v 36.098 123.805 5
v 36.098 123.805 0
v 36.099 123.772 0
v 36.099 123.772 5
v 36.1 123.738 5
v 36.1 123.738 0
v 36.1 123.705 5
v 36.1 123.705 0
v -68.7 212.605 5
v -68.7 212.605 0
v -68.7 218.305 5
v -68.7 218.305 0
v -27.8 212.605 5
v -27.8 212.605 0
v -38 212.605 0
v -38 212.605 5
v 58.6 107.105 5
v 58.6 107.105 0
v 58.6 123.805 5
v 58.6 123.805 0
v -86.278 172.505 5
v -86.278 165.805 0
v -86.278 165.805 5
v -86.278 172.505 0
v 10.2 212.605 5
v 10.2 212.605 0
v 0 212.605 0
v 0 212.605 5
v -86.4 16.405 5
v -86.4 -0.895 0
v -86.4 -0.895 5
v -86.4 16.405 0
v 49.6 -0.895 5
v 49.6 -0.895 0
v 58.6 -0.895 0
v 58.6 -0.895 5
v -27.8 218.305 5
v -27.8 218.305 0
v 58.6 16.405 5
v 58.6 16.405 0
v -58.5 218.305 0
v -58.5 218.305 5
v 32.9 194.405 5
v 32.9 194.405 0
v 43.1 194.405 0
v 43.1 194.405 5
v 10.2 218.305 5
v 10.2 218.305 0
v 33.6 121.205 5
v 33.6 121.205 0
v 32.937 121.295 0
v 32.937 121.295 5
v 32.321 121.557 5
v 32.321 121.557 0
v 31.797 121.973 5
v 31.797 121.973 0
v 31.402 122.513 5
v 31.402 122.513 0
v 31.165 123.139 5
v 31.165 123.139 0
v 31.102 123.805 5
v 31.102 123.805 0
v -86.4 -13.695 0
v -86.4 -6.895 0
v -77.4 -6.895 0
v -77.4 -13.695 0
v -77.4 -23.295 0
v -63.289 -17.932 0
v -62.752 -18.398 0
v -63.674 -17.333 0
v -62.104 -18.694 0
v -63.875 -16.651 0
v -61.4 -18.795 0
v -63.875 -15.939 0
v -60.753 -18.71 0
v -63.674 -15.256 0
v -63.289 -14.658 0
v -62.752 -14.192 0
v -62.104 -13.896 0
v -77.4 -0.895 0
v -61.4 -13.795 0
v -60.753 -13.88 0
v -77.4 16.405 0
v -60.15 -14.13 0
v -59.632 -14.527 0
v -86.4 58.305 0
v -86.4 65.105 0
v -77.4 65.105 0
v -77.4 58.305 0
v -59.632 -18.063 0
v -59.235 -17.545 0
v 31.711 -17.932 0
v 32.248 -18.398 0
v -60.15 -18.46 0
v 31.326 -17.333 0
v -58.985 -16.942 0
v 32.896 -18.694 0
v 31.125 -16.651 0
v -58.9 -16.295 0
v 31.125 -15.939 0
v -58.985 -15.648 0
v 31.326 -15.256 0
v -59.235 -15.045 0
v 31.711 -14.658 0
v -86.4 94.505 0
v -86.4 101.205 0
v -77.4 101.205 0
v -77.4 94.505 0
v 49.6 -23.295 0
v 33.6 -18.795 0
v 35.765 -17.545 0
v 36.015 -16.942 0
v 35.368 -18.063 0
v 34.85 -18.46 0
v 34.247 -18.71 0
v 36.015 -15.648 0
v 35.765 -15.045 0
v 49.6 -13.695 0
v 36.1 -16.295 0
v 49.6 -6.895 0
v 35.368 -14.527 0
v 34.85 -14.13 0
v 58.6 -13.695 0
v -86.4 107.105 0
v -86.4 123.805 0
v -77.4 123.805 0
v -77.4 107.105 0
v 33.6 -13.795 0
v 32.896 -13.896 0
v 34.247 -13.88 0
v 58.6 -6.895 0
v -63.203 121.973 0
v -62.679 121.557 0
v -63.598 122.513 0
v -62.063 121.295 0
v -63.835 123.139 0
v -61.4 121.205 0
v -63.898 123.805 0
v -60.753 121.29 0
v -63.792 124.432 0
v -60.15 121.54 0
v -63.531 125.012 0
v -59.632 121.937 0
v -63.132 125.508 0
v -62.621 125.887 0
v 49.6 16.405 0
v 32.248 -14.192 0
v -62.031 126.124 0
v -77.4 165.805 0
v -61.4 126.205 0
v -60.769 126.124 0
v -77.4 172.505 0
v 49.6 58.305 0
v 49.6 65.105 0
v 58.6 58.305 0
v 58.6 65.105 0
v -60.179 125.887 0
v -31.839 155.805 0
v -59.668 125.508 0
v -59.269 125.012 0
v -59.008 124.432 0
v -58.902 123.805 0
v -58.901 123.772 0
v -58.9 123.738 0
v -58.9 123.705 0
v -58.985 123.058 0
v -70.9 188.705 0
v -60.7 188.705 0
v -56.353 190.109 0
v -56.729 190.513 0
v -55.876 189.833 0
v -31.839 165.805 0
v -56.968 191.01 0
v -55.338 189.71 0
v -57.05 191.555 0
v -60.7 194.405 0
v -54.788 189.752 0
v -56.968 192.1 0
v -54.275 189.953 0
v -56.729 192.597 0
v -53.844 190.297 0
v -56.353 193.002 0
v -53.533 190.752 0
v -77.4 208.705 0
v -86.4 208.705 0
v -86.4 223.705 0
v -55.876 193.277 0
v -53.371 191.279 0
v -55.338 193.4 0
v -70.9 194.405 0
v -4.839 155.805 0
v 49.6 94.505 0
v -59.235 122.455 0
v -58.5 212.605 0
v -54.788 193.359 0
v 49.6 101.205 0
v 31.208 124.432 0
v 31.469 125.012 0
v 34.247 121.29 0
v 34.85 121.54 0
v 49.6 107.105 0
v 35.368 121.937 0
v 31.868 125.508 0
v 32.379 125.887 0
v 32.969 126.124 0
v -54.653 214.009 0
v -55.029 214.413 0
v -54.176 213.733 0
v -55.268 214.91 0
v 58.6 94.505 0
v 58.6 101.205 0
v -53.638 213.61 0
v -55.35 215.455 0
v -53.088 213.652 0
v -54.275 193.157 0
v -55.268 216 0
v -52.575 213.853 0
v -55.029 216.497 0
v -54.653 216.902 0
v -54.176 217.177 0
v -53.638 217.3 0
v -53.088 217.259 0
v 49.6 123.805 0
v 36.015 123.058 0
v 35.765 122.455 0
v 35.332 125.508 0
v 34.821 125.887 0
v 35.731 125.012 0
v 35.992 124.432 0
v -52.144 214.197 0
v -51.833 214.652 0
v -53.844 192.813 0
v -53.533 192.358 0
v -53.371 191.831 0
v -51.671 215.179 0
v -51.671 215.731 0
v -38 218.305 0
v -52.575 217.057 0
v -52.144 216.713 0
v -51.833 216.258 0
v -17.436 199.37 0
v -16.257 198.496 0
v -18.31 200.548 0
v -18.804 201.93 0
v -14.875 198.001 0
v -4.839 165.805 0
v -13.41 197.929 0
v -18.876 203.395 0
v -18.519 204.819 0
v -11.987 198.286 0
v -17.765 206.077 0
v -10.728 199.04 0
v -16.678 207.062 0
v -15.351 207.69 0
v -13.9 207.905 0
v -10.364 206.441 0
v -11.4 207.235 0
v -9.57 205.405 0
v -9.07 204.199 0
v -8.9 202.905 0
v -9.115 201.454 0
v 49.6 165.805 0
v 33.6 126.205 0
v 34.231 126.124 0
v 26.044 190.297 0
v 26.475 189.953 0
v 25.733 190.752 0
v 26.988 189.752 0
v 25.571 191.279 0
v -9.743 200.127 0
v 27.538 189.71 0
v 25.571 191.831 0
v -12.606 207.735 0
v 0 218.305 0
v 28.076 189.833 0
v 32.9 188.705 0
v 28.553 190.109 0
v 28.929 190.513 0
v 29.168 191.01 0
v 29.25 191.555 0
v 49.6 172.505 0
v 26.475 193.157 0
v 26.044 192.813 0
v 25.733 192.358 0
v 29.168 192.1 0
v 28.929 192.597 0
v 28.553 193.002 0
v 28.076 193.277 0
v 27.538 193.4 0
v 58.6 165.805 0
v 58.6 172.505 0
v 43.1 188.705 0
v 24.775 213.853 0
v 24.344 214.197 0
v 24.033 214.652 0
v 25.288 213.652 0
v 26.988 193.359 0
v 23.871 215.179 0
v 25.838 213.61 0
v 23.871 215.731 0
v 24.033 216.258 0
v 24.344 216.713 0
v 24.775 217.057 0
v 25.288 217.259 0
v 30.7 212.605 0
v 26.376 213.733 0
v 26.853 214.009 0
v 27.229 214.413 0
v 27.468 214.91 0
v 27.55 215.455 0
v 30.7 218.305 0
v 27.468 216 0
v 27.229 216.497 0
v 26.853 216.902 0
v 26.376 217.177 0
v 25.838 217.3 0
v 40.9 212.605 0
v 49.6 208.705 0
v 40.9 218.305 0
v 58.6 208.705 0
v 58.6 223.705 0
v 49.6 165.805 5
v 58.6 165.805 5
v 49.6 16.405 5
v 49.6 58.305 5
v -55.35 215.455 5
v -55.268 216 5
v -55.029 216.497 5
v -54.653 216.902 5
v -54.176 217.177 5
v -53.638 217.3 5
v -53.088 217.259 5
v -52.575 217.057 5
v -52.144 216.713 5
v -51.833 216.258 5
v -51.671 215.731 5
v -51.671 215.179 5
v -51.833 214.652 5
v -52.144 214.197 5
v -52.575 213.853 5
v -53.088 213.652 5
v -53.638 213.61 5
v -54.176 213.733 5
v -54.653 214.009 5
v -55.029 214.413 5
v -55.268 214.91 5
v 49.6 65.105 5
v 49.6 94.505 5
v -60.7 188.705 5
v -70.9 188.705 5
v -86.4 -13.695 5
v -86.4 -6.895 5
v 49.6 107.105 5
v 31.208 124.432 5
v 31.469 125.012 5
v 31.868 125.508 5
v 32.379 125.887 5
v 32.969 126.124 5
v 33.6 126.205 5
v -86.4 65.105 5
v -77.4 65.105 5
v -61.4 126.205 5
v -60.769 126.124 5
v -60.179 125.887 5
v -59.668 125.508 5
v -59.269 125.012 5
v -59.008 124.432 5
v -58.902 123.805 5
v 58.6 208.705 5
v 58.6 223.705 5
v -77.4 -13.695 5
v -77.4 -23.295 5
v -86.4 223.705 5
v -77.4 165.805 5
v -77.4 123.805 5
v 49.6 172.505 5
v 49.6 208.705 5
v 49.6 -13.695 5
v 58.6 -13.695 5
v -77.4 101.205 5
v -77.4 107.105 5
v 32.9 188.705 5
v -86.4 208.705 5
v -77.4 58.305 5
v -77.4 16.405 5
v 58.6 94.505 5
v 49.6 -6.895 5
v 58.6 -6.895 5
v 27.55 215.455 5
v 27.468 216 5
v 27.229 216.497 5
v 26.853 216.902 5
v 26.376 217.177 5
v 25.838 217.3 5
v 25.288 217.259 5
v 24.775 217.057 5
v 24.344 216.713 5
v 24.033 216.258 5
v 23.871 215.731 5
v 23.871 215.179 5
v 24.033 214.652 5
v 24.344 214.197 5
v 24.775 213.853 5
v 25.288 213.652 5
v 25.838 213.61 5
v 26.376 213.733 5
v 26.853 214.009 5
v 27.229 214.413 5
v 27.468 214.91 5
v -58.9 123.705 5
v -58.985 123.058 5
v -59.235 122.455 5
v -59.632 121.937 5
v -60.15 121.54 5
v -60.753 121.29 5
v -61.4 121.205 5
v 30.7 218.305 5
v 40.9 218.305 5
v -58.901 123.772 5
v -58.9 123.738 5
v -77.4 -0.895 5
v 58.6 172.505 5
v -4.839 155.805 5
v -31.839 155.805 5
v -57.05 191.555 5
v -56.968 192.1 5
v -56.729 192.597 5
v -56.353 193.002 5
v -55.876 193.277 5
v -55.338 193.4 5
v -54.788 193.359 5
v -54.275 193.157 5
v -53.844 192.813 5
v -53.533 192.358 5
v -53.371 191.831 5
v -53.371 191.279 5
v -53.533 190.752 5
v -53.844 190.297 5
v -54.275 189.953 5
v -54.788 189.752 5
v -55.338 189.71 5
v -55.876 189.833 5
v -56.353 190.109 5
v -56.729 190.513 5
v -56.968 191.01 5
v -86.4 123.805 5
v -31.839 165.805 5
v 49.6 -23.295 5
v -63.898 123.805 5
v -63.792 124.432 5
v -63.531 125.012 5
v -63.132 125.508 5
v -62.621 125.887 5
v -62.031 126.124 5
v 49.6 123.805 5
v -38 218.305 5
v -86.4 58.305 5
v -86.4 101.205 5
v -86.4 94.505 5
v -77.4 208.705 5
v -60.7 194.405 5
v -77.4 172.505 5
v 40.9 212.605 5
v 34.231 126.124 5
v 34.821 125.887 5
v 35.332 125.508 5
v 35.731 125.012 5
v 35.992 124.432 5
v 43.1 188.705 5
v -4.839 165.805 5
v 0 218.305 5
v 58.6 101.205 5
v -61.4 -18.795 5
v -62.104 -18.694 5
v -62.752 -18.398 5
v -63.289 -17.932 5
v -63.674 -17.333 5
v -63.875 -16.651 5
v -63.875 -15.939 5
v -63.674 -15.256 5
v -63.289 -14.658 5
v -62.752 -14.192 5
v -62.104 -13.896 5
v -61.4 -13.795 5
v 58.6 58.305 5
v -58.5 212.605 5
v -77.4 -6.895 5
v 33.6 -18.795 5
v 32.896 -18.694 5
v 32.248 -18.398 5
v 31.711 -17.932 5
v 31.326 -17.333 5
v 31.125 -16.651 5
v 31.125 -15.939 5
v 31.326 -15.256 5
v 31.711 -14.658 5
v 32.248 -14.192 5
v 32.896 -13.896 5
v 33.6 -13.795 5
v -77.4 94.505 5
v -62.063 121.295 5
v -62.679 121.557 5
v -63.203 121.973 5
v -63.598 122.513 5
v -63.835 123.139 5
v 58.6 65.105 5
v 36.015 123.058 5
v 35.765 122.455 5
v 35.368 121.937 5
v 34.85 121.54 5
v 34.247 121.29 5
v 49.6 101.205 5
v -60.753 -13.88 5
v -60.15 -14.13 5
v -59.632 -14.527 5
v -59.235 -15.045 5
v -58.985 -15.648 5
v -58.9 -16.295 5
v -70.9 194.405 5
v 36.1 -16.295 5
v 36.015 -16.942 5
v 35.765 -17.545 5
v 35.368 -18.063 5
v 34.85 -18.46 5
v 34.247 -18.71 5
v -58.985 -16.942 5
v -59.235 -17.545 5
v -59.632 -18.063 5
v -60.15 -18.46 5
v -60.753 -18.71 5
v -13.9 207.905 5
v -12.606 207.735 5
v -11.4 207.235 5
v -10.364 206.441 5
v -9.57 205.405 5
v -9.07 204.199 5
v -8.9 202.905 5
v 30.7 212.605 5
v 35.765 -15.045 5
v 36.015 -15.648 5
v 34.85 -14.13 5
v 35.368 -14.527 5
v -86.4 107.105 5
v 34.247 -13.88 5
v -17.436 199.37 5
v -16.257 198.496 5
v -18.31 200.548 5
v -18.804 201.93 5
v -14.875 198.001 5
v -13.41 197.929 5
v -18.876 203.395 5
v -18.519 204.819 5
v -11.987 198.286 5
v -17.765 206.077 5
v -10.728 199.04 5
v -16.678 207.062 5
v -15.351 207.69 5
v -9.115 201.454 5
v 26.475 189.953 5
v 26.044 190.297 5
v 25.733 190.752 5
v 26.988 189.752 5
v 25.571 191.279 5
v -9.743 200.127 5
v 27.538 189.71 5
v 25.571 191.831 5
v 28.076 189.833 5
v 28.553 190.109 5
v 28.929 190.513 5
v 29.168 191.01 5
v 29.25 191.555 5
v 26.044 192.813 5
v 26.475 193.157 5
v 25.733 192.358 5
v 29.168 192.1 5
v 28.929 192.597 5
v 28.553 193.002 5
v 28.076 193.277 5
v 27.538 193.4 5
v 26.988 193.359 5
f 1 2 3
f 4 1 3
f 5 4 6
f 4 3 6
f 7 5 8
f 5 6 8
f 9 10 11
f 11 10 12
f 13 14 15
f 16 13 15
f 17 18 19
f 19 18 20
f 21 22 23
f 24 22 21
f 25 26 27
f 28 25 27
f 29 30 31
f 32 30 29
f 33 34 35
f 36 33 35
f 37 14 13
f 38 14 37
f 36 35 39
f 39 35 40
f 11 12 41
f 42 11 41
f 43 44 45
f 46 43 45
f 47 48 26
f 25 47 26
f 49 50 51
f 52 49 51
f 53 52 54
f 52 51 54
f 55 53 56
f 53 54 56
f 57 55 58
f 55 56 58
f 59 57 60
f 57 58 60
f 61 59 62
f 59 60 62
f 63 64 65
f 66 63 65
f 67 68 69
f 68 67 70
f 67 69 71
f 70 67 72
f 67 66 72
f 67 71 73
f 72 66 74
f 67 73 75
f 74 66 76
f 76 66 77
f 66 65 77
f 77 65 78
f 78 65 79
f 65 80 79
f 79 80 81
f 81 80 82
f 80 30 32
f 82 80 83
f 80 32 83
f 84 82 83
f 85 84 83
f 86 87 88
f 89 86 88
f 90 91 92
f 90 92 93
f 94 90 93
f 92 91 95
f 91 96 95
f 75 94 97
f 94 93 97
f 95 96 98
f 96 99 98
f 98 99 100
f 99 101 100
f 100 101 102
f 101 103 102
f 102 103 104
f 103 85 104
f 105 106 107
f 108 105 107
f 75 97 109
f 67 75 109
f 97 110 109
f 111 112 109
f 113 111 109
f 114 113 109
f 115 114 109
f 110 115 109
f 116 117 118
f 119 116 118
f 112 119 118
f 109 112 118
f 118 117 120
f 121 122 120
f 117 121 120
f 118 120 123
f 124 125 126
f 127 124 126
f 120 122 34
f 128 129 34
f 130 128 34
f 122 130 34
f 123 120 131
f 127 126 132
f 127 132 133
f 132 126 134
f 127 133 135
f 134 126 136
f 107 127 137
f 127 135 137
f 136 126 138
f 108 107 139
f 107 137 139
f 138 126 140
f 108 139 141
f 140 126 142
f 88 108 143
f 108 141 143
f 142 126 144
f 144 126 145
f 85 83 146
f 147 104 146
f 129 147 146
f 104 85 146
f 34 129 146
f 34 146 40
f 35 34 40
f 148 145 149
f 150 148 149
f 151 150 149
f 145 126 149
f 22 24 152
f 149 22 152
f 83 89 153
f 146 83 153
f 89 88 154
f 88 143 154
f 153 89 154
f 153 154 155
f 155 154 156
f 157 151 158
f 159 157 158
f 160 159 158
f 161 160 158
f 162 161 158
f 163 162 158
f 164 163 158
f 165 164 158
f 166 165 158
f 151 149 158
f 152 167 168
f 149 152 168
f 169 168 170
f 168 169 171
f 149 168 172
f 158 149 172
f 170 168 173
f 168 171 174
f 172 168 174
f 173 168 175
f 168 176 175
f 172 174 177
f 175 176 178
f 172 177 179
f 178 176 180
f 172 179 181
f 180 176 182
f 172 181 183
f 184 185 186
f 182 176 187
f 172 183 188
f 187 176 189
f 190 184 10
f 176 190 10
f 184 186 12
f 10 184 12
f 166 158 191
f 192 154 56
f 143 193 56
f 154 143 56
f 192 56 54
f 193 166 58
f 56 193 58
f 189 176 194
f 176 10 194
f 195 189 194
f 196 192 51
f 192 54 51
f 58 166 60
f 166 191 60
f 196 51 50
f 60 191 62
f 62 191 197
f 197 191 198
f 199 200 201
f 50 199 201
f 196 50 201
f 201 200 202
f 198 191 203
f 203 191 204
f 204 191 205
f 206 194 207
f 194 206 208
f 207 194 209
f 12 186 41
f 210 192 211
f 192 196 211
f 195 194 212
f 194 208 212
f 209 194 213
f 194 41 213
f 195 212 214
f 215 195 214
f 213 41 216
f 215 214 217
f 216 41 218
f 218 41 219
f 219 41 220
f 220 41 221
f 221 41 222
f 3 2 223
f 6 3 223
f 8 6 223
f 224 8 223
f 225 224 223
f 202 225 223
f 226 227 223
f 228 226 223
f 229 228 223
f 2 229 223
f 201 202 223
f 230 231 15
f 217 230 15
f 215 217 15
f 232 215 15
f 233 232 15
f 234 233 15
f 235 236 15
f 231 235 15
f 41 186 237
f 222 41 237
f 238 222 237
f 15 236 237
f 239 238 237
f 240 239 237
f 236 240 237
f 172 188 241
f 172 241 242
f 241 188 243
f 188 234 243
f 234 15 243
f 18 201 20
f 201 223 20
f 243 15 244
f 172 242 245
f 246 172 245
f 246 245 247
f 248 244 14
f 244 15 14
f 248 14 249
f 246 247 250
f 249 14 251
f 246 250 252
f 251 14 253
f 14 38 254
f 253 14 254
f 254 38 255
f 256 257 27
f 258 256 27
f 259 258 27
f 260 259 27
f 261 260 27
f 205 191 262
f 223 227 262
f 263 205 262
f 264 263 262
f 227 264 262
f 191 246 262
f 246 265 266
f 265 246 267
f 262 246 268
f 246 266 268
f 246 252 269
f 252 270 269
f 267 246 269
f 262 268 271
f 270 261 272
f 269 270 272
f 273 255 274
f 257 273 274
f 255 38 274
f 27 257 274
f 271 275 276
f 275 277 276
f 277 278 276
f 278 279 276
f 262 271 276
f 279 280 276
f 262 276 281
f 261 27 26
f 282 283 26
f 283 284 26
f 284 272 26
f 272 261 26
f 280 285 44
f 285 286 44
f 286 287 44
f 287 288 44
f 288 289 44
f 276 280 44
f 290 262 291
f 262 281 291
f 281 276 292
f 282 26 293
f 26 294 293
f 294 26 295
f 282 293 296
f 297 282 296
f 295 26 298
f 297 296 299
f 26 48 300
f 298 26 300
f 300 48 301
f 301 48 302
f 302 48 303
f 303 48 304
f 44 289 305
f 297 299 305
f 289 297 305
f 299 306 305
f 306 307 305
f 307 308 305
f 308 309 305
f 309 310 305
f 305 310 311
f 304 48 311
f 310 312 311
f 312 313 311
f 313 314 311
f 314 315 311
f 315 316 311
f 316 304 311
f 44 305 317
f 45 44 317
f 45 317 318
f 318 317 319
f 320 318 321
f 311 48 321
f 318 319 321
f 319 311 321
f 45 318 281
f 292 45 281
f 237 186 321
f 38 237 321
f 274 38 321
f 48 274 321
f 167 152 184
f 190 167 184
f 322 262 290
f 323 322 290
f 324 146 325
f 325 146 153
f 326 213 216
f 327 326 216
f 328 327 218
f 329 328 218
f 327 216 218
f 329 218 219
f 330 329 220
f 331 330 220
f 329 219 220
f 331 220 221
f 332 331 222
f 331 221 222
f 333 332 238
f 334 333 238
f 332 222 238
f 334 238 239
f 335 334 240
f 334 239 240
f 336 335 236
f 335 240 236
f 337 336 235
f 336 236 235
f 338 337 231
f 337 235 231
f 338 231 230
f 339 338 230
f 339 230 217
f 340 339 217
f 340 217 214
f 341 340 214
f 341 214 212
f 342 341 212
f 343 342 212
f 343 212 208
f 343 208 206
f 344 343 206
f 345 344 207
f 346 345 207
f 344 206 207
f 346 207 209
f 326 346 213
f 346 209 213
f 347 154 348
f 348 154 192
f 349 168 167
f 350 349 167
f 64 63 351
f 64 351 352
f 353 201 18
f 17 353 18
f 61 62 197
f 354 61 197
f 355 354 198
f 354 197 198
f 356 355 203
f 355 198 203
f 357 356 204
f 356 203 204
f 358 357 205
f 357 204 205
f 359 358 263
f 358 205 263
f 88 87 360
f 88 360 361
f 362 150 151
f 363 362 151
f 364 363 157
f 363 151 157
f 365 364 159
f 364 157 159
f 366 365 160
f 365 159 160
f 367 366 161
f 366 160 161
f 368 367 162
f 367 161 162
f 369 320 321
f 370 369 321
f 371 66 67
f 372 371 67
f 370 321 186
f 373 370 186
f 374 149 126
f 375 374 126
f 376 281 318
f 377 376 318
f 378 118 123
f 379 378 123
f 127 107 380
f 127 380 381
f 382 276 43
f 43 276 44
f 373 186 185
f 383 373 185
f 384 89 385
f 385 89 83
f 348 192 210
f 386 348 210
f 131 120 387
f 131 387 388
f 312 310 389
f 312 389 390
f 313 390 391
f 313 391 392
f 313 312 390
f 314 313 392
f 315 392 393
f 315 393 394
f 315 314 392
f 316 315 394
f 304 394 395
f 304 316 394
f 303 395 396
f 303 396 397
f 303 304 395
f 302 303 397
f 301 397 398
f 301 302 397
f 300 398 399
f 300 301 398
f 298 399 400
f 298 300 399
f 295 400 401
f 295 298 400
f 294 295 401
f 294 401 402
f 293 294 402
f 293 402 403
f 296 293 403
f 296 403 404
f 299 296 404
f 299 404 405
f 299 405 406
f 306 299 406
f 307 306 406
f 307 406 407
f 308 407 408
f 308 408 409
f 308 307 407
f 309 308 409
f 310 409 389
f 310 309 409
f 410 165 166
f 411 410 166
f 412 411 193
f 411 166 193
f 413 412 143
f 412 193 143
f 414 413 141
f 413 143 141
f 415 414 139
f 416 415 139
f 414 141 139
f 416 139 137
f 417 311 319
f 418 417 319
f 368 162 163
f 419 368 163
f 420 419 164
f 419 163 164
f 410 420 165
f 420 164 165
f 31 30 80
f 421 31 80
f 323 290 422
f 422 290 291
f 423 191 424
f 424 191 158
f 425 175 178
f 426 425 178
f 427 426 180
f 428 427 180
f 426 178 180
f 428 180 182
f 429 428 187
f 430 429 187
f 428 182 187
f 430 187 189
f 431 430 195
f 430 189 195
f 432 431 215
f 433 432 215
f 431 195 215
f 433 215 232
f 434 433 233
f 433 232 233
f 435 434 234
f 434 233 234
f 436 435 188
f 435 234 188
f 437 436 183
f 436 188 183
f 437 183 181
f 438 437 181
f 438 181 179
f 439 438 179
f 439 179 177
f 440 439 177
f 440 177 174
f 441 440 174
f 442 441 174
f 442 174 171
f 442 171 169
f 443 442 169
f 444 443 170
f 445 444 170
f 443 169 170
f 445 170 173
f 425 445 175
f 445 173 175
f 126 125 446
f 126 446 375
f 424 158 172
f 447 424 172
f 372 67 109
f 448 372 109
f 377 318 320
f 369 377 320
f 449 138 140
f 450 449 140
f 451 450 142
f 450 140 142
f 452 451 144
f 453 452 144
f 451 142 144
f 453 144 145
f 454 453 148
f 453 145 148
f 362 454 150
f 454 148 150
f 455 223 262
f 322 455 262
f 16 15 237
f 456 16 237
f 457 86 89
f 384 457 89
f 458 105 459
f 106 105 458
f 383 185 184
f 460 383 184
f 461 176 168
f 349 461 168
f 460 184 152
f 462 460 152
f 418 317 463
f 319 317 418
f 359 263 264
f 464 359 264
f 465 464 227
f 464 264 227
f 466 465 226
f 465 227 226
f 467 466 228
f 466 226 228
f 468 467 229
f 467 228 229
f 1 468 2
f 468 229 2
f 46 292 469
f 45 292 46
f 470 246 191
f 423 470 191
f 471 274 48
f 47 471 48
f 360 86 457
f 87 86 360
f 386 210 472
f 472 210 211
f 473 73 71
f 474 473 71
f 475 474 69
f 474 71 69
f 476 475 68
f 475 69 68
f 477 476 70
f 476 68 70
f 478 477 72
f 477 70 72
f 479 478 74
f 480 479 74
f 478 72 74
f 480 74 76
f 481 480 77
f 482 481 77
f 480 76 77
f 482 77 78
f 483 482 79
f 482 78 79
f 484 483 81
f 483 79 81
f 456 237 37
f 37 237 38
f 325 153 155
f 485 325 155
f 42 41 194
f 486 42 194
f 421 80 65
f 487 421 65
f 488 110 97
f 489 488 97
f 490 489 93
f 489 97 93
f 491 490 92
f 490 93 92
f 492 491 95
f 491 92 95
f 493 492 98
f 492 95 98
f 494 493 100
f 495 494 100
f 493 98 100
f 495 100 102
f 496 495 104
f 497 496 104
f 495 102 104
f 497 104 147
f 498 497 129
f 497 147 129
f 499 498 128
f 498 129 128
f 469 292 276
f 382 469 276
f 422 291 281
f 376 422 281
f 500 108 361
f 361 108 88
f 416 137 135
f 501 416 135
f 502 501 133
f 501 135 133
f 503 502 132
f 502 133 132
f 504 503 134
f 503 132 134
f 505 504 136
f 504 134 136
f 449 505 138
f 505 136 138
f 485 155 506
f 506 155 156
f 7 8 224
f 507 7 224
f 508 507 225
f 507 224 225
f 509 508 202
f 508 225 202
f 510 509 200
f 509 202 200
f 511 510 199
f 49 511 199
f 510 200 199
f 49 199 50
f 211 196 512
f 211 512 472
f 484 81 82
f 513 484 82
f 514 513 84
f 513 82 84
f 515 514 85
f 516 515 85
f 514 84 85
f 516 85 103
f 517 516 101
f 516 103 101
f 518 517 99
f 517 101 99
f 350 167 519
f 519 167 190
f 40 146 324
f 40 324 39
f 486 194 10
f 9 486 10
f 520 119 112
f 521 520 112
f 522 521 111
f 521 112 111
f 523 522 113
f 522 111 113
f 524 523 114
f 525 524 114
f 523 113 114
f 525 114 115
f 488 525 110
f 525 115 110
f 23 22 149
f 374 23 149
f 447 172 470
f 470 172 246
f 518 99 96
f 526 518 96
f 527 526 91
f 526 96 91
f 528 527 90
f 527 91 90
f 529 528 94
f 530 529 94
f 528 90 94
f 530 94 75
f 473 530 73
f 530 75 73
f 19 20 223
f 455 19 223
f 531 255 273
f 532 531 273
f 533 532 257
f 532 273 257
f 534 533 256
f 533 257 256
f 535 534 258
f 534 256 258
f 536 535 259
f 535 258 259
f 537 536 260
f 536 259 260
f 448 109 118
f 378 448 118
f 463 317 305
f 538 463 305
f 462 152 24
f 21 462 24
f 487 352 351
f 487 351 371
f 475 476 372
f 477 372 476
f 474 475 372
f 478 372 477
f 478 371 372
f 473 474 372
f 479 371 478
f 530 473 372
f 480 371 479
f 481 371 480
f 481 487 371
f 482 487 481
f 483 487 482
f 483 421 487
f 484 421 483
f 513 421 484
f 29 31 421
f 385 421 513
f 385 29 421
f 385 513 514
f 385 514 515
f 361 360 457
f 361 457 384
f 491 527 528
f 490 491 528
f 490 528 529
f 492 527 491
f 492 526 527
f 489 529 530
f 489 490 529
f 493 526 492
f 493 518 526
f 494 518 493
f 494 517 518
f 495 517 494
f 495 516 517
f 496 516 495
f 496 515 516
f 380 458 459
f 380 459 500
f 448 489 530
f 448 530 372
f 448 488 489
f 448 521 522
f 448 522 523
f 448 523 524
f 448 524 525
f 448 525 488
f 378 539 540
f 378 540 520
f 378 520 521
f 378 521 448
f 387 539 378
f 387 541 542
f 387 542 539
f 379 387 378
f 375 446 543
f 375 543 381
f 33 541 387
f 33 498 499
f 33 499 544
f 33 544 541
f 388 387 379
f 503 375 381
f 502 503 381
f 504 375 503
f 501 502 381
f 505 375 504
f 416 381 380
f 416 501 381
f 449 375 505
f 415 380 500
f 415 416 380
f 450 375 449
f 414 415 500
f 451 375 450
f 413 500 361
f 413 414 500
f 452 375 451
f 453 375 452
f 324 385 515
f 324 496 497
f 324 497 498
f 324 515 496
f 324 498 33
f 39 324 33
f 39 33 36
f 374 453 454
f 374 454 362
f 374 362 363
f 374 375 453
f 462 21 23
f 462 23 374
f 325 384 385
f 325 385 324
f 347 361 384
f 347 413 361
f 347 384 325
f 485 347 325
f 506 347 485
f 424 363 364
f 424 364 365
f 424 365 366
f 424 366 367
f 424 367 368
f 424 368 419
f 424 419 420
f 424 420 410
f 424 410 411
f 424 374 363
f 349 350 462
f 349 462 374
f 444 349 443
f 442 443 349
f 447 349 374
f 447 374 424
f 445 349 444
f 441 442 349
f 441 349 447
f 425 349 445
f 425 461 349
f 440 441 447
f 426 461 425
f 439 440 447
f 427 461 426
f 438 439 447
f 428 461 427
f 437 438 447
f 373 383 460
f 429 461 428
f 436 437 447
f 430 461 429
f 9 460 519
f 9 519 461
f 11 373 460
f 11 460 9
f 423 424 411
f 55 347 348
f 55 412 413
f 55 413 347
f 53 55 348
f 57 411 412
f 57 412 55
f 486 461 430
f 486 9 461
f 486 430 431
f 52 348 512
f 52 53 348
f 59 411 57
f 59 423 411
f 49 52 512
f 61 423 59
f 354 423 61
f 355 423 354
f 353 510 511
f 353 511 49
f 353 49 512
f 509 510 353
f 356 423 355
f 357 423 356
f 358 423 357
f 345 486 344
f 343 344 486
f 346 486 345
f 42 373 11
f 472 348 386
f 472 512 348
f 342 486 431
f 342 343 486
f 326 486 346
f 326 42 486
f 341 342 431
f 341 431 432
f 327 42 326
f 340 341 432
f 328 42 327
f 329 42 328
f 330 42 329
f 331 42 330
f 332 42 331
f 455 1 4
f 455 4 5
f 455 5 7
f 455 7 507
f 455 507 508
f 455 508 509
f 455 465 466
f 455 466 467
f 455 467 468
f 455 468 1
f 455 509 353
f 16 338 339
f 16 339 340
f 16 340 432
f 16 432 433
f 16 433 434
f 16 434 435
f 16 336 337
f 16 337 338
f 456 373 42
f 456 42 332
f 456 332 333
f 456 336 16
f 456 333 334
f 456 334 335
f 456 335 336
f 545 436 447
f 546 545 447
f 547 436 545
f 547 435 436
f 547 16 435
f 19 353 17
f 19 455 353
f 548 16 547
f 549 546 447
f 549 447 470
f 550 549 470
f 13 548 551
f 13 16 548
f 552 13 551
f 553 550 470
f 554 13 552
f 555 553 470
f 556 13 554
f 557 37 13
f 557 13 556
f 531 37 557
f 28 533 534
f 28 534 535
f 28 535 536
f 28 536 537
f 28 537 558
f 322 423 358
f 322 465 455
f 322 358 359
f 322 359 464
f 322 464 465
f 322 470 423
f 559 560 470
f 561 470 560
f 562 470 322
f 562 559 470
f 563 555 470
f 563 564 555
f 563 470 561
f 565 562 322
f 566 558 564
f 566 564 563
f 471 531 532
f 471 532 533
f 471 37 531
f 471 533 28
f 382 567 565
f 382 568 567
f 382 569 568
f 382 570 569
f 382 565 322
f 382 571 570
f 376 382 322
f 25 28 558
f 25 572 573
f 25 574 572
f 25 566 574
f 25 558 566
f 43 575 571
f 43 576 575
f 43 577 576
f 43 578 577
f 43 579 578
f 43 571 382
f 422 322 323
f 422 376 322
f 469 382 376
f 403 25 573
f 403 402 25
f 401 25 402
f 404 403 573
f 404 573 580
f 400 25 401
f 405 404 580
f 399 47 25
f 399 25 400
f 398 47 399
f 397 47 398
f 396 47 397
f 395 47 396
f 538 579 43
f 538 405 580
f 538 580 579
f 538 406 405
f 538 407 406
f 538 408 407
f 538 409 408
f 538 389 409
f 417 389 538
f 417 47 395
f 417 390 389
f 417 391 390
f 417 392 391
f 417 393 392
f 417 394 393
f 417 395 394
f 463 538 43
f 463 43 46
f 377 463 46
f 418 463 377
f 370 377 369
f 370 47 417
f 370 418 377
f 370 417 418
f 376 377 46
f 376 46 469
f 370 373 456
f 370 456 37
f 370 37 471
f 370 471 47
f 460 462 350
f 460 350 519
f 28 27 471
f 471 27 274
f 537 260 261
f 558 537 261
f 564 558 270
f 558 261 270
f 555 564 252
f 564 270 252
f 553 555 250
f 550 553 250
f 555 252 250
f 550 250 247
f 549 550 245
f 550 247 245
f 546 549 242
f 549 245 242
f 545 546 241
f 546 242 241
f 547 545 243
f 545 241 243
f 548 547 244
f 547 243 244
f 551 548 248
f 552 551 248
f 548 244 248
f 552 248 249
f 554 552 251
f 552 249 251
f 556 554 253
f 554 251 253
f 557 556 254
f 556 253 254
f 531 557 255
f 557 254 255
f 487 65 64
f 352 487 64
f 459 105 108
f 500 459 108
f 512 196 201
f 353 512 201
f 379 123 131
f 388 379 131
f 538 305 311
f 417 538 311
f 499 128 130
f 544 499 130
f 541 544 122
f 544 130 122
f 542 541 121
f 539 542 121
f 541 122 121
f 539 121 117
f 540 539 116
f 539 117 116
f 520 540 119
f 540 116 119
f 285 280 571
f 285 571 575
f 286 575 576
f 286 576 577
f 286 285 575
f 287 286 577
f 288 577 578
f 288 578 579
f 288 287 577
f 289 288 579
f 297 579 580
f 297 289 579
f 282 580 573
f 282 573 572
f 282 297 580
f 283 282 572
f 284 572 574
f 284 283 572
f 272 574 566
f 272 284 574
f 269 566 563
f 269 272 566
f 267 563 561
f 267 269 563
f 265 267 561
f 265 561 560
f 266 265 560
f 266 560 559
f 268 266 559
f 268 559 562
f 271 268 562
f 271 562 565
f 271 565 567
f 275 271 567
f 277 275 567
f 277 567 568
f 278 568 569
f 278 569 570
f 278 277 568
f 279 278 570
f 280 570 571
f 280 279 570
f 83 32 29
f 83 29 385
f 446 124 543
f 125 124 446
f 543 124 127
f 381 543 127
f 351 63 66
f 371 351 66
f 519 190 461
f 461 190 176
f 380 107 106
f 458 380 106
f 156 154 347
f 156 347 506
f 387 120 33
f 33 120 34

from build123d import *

# Parameters (mm, degrees)
F0_W     = 9
F0_H     = 16.7
F0_H_2   = 6.7
F0_W_2   = 16
F0_H_3   = 5.9
F0_W_3   = 95
F0_W_4   = 8.8775146961
F0_W_5   = 6.5
F0_H_4   = 5.7
F0_R     = 1.85
F0_W_6   = 8.7
F0_W_7   = 13.9
F0_H_5   = 29.4
F0_H_6   = 6.8
F0_H_7   = 41.9
F0_H_8   = 6
F0_H_9   = 17.3
F1_DEPTH = 5


with BuildPart() as f1:
    # F0 (on Top) → F1 (new body)
    with BuildSketch(Plane.XY):
        with BuildLine():
            Line((-77.4, 165.8051506788), (-77.4, 123.8051506788))
            Line((-77.4, 123.8051506788), (-63.8979991994, 123.8051506788))
            ThreePointArc((-63.8979991994, 123.8051506788), (-63.1320508076, 125.5079263165), (-61.4, 126.2051506788))
            Line((-61.4, 126.2051506788), (-61.4, 165.8051506788))
            Line((-61.4, 165.8051506788), (-77.4, 165.8051506788))
        make_face()
        with BuildLine():
            Line((-77.4, 123.8051506788), (-77.4, 107.1051506788))
            Line((-77.4, 107.1051506788), (-61.4, 107.1051506788))
            Line((-61.4, 107.1051506788), (-61.4, 121.2051506788))
            ThreePointArc((-61.4, 121.2051506788), (-63.2027756377, 121.9730998712), (-63.8979991994, 123.8051506788))
            Line((-63.8979991994, 123.8051506788), (-77.4, 123.8051506788))
        make_face()
        with BuildLine():
            Line((-31.8387573481, 165.8051506788), (-61.4, 165.8051506788))
            Line((-61.4, 165.8051506788), (-61.4, 126.2051506788))
            ThreePointArc((-61.4, 126.2051506788), (-59.6679491924, 125.5079263165), (-58.9020008006, 123.8051506788))
            Line((-58.9020008006, 123.8051506788), (31.1020008006, 123.8051506788))
            ThreePointArc((31.1020008006, 123.8051506788), (31.8679491924, 125.5079263165), (33.6, 126.2051506788))
            Line((33.6, 126.2051506788), (33.6, 165.8051506788))
            Line((33.6, 165.8051506788), (-4.8387573481, 165.8051506788))
            Line((-4.8387573481, 165.8051506788), (-4.8387573481, 155.8051506788))
            Line((-4.8387573481, 155.8051506788), (-31.8387573481, 155.8051506788))
            Line((-31.8387573481, 155.8051506788), (-31.8387573481, 165.8051506788))
        make_face()
        with BuildLine():
            Line((-61.4, 121.2051506788), (-61.4, 107.1051506788))
            Line((-61.4, 107.1051506788), (33.6, 107.1051506788))
            Line((33.6, 107.1051506788), (33.6, 121.2051506788))
            ThreePointArc((33.6, 121.2051506788), (31.7972243623, 121.9730998712), (31.1020008006, 123.8051506788))
            Line((31.1020008006, 123.8051506788), (-58.9020008006, 123.8051506788))
            ThreePointArc((-58.9020008006, 123.8051506788), (-58.9005002502, 123.7551606858), (-58.9, 123.7051506788))
            ThreePointArc((-58.9, 123.7051506788), (-59.632233047, 121.9373837258), (-61.4, 121.2051506788))
        make_face()
        with BuildLine():
            Line((33.6, 121.2051506788), (33.6, 107.1051506788))
            Line((33.6, 107.1051506788), (49.6, 107.1051506788))
            Line((49.6, 107.1051506788), (49.6, 123.8051506788))
            Line((49.6, 123.8051506788), (36.0979991994, 123.8051506788))
            ThreePointArc((36.0979991994, 123.8051506788), (36.0994997498, 123.7551606858), (36.1, 123.7051506788))
            ThreePointArc((36.1, 123.7051506788), (35.367766953, 121.9373837258), (33.6, 121.2051506788))
        make_face()
        with Locations((54.1, 115.4551506788)):
            Rectangle(F0_W, F0_H)
        with Locations((-81.9, 115.4551506788)):
            Rectangle(F0_W, F0_H)
        with Locations((-81.9, 97.8551506788)):
            Rectangle(F0_W, F0_H_2)
        with Locations((-69.4, 97.8551506788)):
            Rectangle(F0_W_2, F0_H_2)
        with Locations((-69.4, 104.1551506788)):
            Rectangle(F0_W_2, F0_H_3)
        with Locations((-13.9, 104.1551506788)):
            Rectangle(F0_W_3, F0_H_3)
        with Locations((-13.9, 97.8551506788)):
            Rectangle(F0_W_3, F0_H_2)
        with Locations((41.6, 97.8551506788)):
            Rectangle(F0_W_2, F0_H_2)
        with Locations((41.6, 104.1551506788)):
            Rectangle(F0_W_2, F0_H_3)
        with Locations((54.1, 97.8551506788)):
            Rectangle(F0_W, F0_H_2)
        with BuildLine():
            Line((36.0979991994, 123.8051506788), (49.6, 123.8051506788))
            Line((49.6, 123.8051506788), (49.6, 165.8051506788))
            Line((49.6, 165.8051506788), (33.6, 165.8051506788))
            Line((33.6, 165.8051506788), (33.6, 126.2051506788))
            ThreePointArc((33.6, 126.2051506788), (35.3320508076, 125.5079263165), (36.0979991994, 123.8051506788))
        make_face()
        with Locations((54.1, 169.1551506788)):
            Rectangle(F0_W, F0_H_2)
        Polygon((-77.4, 172.5051506788), (-77.4, 165.8051506788), (-61.4, 165.8051506788), (-31.8387573481, 165.8051506788), (-18.3387573481, 165.8051506788), (-4.8387573481, 165.8051506788), (33.6, 165.8051506788), (49.6, 165.8051506788), (49.6, 172.5051506788), (-8.3387573481, 172.5051506788), (-28.3387573481, 172.5051506788), align=None)
        with Locations((-81.8387573481, 169.1551506788)):
            Rectangle(F0_W_4, F0_H_2)
        Polygon((-77.4, 188.7051506788), (-77.4, 172.5051506788), (-28.3387573481, 172.5051506788), (-8.3387573481, 172.5051506788), (49.6, 172.5051506788), (49.6, 188.7051506788), (43.1, 188.7051506788), (32.9, 188.7051506788), (-60.7, 188.7051506788), (-70.9, 188.7051506788), align=None)
        with Locations((-74.15, 191.5551506788)):
            Rectangle(F0_W_5, F0_H_4)
        Polygon((-60.7, 191.5551506788), (-60.7, 188.7051506788), (32.9, 188.7051506788), (32.9, 191.5551506788), (32.9, 194.4051506788), (-60.7, 194.4051506788), align=None)
        with BuildLine():
            ThreePointArc((-53.35, 191.5551506788), (-55.2, 189.7051506788), (-57.05, 191.5551506788))
            ThreePointArc((-57.05, 191.5551506788), (-55.2, 193.4051506788), (-53.35, 191.5551506788))
        make_face(mode=Mode.SUBTRACT)
        with Locations((27.4, 191.5551506788)):
            Circle(F0_R, mode=Mode.SUBTRACT)
        with Locations((46.35, 191.5551506788)):
            Rectangle(F0_W_5, F0_H_4)
        Polygon((-77.4, 208.7051506788), (-77.4, 194.4051506788), (-70.9, 194.4051506788), (-60.7, 194.4051506788), (32.9, 194.4051506788), (43.1, 194.4051506788), (49.6, 194.4051506788), (49.6, 208.7051506788), (-13.9, 208.7051506788), align=None)
        with BuildLine():
            ThreePointArc((-8.9, 202.9051506788), (-17.4355339059, 199.3696167728), (-13.9, 207.9051506788))
            ThreePointArc((-13.9, 207.9051506788), (-10.3644660941, 206.4406845847), (-8.9, 202.9051506788))
        make_face(mode=Mode.SUBTRACT)
        Polygon((-86.4, 208.7051506788), (-77.4, 208.7051506788), (-77.4, 212.6051506788), (-77.4, 218.3051506788), (-77.4, 223.7051506788), (-86.4, 223.7051506788), align=None)
        with Locations((-73.05, 215.4551506788)):
            Rectangle(F0_W_6, F0_H_4)
        Polygon((-77.4, 212.6051506788), (-77.4, 208.7051506788), (-13.9, 208.7051506788), (-13.9, 212.6051506788), (-27.8, 212.6051506788), (-38, 212.6051506788), (-58.5, 212.6051506788), (-68.7, 212.6051506788), align=None)
        Polygon((-77.4, 223.7051506788), (-77.4, 218.3051506788), (-68.7, 218.3051506788), (-58.5, 218.3051506788), (-38, 218.3051506788), (-27.8, 218.3051506788), (-13.9, 218.3051506788), (-13.9, 223.7051506788), align=None)
        Polygon((-58.5, 215.4551506788), (-58.5, 212.6051506788), (-38, 212.6051506788), (-38, 218.3051506788), (-58.5, 218.3051506788), align=None)
        with BuildLine():
            ThreePointArc((-51.65, 215.4551506788), (-53.5, 213.6051506788), (-55.35, 215.4551506788))
            ThreePointArc((-55.35, 215.4551506788), (-53.5, 217.3051506788), (-51.65, 215.4551506788))
        make_face(mode=Mode.SUBTRACT)
        with Locations((-20.85, 215.4551506788)):
            Rectangle(F0_W_7, F0_H_4)
        with Locations((-6.95, 215.4551506788)):
            Rectangle(F0_W_7, F0_H_4)
        Polygon((-13.9, 212.6051506788), (-13.9, 208.7051506788), (49.6, 208.7051506788), (49.6, 212.6051506788), (40.9, 212.6051506788), (30.7, 212.6051506788), (10.2, 212.6051506788), (0, 212.6051506788), align=None)
        Polygon((-13.9, 223.7051506788), (-13.9, 218.3051506788), (0, 218.3051506788), (10.2, 218.3051506788), (30.7, 218.3051506788), (40.9, 218.3051506788), (49.6, 218.3051506788), (49.6, 223.7051506788), align=None)
        Polygon((10.2, 218.3051506788), (10.2, 212.6051506788), (30.7, 212.6051506788), (30.7, 215.4551506788), (30.7, 218.3051506788), align=None)
        with Locations((25.7, 215.4551506788)):
            Circle(F0_R, mode=Mode.SUBTRACT)
        with Locations((45.25, 215.4551506788)):
            Rectangle(F0_W_6, F0_H_4)
        Polygon((49.6, 212.6051506788), (49.6, 208.7051506788), (58.6, 208.7051506788), (58.6, 223.7051506788), (49.6, 223.7051506788), (49.6, 218.3051506788), align=None)
        with Locations((-13.9, 79.8051506788)):
            Rectangle(F0_W_3, F0_H_5)
        with Locations((-69.4, 79.8051506788)):
            Rectangle(F0_W_2, F0_H_5)
        with Locations((41.6, 79.8051506788)):
            Rectangle(F0_W_2, F0_H_5)
        with Locations((41.6, 61.7051506788)):
            Rectangle(F0_W_2, F0_H_6)
        with Locations((54.1, 61.7051506788)):
            Rectangle(F0_W, F0_H_6)
        with Locations((-69.4, 61.7051506788)):
            Rectangle(F0_W_2, F0_H_6)
        with Locations((-81.9, 61.7051506788)):
            Rectangle(F0_W, F0_H_6)
        with Locations((-69.4, 37.3551506788)):
            Rectangle(F0_W_2, F0_H_7)
        with Locations((-13.9, 37.3551506788)):
            Rectangle(F0_W_3, F0_H_7)
        with Locations((41.6, 37.3551506788)):
            Rectangle(F0_W_2, F0_H_7)
        with Locations((-13.9, 61.7051506788)):
            Rectangle(F0_W_3, F0_H_6)
        with BuildLine():
            Line((-77.4, -13.6948493212), (-77.4, -23.2948493212))
            Line((-77.4, -23.2948493212), (-61.4, -23.2948493212))
            Line((-61.4, -23.2948493212), (-61.4, -18.7948493212))
            ThreePointArc((-61.4, -18.7948493212), (-63.9, -16.2948493212), (-61.4, -13.7948493212))
            Line((-61.4, -13.7948493212), (-61.4, -13.6948493212))
            Line((-61.4, -13.6948493212), (-77.4, -13.6948493212))
        make_face()
        with Locations((-69.4, -10.2948493212)):
            Rectangle(F0_W_2, F0_H_6)
        with Locations((-81.9, -10.2948493212)):
            Rectangle(F0_W, F0_H_6)
        with Locations((-69.4, -3.8948493212)):
            Rectangle(F0_W_2, F0_H_8)
        with Locations((-69.4, 7.7551506788)):
            Rectangle(F0_W_2, F0_H_9)
        with Locations((-81.9, 7.7551506788)):
            Rectangle(F0_W, F0_H_9)
        with Locations((-13.9, 7.7551506788)):
            Rectangle(F0_W_3, F0_H_9)
        with Locations((41.6, 7.7551506788)):
            Rectangle(F0_W_2, F0_H_9)
        with Locations((54.1, 7.7551506788)):
            Rectangle(F0_W, F0_H_9)
        with Locations((-13.9, -3.8948493212)):
            Rectangle(F0_W_3, F0_H_8)
        with Locations((-13.9, -10.2948493212)):
            Rectangle(F0_W_3, F0_H_6)
        with BuildLine():
            Line((-61.4, -18.7948493212), (-61.4, -23.2948493212))
            Line((-61.4, -23.2948493212), (33.6, -23.2948493212))
            Line((33.6, -23.2948493212), (33.6, -18.7948493212))
            ThreePointArc((33.6, -18.7948493212), (31.1, -16.2948493212), (33.6, -13.7948493212))
            Line((33.6, -13.7948493212), (33.6, -13.6948493212))
            Line((33.6, -13.6948493212), (-61.4, -13.6948493212))
            Line((-61.4, -13.6948493212), (-61.4, -13.7948493212))
            ThreePointArc((-61.4, -13.7948493212), (-59.632233047, -14.5270823683), (-58.9, -16.2948493212))
            ThreePointArc((-58.9, -16.2948493212), (-59.632233047, -18.0626162742), (-61.4, -18.7948493212))
        make_face()
        with BuildLine():
            Line((33.6, -18.7948493212), (33.6, -23.2948493212))
            Line((33.6, -23.2948493212), (49.6, -23.2948493212))
            Line((49.6, -23.2948493212), (49.6, -13.6948493212))
            Line((49.6, -13.6948493212), (33.6, -13.6948493212))
            Line((33.6, -13.6948493212), (33.6, -13.7948493212))
            ThreePointArc((33.6, -13.7948493212), (35.367766953, -14.5270823683), (36.1, -16.2948493212))
            ThreePointArc((36.1, -16.2948493212), (35.367766953, -18.0626162742), (33.6, -18.7948493212))
        make_face()
        with Locations((41.6, -10.2948493212)):
            Rectangle(F0_W_2, F0_H_6)
        with Locations((41.6, -3.8948493212)):
            Rectangle(F0_W_2, F0_H_8)
        with Locations((54.1, -10.2948493212)):
            Rectangle(F0_W, F0_H_6)
    extrude(amount=F1_DEPTH)


solid = f1.part
